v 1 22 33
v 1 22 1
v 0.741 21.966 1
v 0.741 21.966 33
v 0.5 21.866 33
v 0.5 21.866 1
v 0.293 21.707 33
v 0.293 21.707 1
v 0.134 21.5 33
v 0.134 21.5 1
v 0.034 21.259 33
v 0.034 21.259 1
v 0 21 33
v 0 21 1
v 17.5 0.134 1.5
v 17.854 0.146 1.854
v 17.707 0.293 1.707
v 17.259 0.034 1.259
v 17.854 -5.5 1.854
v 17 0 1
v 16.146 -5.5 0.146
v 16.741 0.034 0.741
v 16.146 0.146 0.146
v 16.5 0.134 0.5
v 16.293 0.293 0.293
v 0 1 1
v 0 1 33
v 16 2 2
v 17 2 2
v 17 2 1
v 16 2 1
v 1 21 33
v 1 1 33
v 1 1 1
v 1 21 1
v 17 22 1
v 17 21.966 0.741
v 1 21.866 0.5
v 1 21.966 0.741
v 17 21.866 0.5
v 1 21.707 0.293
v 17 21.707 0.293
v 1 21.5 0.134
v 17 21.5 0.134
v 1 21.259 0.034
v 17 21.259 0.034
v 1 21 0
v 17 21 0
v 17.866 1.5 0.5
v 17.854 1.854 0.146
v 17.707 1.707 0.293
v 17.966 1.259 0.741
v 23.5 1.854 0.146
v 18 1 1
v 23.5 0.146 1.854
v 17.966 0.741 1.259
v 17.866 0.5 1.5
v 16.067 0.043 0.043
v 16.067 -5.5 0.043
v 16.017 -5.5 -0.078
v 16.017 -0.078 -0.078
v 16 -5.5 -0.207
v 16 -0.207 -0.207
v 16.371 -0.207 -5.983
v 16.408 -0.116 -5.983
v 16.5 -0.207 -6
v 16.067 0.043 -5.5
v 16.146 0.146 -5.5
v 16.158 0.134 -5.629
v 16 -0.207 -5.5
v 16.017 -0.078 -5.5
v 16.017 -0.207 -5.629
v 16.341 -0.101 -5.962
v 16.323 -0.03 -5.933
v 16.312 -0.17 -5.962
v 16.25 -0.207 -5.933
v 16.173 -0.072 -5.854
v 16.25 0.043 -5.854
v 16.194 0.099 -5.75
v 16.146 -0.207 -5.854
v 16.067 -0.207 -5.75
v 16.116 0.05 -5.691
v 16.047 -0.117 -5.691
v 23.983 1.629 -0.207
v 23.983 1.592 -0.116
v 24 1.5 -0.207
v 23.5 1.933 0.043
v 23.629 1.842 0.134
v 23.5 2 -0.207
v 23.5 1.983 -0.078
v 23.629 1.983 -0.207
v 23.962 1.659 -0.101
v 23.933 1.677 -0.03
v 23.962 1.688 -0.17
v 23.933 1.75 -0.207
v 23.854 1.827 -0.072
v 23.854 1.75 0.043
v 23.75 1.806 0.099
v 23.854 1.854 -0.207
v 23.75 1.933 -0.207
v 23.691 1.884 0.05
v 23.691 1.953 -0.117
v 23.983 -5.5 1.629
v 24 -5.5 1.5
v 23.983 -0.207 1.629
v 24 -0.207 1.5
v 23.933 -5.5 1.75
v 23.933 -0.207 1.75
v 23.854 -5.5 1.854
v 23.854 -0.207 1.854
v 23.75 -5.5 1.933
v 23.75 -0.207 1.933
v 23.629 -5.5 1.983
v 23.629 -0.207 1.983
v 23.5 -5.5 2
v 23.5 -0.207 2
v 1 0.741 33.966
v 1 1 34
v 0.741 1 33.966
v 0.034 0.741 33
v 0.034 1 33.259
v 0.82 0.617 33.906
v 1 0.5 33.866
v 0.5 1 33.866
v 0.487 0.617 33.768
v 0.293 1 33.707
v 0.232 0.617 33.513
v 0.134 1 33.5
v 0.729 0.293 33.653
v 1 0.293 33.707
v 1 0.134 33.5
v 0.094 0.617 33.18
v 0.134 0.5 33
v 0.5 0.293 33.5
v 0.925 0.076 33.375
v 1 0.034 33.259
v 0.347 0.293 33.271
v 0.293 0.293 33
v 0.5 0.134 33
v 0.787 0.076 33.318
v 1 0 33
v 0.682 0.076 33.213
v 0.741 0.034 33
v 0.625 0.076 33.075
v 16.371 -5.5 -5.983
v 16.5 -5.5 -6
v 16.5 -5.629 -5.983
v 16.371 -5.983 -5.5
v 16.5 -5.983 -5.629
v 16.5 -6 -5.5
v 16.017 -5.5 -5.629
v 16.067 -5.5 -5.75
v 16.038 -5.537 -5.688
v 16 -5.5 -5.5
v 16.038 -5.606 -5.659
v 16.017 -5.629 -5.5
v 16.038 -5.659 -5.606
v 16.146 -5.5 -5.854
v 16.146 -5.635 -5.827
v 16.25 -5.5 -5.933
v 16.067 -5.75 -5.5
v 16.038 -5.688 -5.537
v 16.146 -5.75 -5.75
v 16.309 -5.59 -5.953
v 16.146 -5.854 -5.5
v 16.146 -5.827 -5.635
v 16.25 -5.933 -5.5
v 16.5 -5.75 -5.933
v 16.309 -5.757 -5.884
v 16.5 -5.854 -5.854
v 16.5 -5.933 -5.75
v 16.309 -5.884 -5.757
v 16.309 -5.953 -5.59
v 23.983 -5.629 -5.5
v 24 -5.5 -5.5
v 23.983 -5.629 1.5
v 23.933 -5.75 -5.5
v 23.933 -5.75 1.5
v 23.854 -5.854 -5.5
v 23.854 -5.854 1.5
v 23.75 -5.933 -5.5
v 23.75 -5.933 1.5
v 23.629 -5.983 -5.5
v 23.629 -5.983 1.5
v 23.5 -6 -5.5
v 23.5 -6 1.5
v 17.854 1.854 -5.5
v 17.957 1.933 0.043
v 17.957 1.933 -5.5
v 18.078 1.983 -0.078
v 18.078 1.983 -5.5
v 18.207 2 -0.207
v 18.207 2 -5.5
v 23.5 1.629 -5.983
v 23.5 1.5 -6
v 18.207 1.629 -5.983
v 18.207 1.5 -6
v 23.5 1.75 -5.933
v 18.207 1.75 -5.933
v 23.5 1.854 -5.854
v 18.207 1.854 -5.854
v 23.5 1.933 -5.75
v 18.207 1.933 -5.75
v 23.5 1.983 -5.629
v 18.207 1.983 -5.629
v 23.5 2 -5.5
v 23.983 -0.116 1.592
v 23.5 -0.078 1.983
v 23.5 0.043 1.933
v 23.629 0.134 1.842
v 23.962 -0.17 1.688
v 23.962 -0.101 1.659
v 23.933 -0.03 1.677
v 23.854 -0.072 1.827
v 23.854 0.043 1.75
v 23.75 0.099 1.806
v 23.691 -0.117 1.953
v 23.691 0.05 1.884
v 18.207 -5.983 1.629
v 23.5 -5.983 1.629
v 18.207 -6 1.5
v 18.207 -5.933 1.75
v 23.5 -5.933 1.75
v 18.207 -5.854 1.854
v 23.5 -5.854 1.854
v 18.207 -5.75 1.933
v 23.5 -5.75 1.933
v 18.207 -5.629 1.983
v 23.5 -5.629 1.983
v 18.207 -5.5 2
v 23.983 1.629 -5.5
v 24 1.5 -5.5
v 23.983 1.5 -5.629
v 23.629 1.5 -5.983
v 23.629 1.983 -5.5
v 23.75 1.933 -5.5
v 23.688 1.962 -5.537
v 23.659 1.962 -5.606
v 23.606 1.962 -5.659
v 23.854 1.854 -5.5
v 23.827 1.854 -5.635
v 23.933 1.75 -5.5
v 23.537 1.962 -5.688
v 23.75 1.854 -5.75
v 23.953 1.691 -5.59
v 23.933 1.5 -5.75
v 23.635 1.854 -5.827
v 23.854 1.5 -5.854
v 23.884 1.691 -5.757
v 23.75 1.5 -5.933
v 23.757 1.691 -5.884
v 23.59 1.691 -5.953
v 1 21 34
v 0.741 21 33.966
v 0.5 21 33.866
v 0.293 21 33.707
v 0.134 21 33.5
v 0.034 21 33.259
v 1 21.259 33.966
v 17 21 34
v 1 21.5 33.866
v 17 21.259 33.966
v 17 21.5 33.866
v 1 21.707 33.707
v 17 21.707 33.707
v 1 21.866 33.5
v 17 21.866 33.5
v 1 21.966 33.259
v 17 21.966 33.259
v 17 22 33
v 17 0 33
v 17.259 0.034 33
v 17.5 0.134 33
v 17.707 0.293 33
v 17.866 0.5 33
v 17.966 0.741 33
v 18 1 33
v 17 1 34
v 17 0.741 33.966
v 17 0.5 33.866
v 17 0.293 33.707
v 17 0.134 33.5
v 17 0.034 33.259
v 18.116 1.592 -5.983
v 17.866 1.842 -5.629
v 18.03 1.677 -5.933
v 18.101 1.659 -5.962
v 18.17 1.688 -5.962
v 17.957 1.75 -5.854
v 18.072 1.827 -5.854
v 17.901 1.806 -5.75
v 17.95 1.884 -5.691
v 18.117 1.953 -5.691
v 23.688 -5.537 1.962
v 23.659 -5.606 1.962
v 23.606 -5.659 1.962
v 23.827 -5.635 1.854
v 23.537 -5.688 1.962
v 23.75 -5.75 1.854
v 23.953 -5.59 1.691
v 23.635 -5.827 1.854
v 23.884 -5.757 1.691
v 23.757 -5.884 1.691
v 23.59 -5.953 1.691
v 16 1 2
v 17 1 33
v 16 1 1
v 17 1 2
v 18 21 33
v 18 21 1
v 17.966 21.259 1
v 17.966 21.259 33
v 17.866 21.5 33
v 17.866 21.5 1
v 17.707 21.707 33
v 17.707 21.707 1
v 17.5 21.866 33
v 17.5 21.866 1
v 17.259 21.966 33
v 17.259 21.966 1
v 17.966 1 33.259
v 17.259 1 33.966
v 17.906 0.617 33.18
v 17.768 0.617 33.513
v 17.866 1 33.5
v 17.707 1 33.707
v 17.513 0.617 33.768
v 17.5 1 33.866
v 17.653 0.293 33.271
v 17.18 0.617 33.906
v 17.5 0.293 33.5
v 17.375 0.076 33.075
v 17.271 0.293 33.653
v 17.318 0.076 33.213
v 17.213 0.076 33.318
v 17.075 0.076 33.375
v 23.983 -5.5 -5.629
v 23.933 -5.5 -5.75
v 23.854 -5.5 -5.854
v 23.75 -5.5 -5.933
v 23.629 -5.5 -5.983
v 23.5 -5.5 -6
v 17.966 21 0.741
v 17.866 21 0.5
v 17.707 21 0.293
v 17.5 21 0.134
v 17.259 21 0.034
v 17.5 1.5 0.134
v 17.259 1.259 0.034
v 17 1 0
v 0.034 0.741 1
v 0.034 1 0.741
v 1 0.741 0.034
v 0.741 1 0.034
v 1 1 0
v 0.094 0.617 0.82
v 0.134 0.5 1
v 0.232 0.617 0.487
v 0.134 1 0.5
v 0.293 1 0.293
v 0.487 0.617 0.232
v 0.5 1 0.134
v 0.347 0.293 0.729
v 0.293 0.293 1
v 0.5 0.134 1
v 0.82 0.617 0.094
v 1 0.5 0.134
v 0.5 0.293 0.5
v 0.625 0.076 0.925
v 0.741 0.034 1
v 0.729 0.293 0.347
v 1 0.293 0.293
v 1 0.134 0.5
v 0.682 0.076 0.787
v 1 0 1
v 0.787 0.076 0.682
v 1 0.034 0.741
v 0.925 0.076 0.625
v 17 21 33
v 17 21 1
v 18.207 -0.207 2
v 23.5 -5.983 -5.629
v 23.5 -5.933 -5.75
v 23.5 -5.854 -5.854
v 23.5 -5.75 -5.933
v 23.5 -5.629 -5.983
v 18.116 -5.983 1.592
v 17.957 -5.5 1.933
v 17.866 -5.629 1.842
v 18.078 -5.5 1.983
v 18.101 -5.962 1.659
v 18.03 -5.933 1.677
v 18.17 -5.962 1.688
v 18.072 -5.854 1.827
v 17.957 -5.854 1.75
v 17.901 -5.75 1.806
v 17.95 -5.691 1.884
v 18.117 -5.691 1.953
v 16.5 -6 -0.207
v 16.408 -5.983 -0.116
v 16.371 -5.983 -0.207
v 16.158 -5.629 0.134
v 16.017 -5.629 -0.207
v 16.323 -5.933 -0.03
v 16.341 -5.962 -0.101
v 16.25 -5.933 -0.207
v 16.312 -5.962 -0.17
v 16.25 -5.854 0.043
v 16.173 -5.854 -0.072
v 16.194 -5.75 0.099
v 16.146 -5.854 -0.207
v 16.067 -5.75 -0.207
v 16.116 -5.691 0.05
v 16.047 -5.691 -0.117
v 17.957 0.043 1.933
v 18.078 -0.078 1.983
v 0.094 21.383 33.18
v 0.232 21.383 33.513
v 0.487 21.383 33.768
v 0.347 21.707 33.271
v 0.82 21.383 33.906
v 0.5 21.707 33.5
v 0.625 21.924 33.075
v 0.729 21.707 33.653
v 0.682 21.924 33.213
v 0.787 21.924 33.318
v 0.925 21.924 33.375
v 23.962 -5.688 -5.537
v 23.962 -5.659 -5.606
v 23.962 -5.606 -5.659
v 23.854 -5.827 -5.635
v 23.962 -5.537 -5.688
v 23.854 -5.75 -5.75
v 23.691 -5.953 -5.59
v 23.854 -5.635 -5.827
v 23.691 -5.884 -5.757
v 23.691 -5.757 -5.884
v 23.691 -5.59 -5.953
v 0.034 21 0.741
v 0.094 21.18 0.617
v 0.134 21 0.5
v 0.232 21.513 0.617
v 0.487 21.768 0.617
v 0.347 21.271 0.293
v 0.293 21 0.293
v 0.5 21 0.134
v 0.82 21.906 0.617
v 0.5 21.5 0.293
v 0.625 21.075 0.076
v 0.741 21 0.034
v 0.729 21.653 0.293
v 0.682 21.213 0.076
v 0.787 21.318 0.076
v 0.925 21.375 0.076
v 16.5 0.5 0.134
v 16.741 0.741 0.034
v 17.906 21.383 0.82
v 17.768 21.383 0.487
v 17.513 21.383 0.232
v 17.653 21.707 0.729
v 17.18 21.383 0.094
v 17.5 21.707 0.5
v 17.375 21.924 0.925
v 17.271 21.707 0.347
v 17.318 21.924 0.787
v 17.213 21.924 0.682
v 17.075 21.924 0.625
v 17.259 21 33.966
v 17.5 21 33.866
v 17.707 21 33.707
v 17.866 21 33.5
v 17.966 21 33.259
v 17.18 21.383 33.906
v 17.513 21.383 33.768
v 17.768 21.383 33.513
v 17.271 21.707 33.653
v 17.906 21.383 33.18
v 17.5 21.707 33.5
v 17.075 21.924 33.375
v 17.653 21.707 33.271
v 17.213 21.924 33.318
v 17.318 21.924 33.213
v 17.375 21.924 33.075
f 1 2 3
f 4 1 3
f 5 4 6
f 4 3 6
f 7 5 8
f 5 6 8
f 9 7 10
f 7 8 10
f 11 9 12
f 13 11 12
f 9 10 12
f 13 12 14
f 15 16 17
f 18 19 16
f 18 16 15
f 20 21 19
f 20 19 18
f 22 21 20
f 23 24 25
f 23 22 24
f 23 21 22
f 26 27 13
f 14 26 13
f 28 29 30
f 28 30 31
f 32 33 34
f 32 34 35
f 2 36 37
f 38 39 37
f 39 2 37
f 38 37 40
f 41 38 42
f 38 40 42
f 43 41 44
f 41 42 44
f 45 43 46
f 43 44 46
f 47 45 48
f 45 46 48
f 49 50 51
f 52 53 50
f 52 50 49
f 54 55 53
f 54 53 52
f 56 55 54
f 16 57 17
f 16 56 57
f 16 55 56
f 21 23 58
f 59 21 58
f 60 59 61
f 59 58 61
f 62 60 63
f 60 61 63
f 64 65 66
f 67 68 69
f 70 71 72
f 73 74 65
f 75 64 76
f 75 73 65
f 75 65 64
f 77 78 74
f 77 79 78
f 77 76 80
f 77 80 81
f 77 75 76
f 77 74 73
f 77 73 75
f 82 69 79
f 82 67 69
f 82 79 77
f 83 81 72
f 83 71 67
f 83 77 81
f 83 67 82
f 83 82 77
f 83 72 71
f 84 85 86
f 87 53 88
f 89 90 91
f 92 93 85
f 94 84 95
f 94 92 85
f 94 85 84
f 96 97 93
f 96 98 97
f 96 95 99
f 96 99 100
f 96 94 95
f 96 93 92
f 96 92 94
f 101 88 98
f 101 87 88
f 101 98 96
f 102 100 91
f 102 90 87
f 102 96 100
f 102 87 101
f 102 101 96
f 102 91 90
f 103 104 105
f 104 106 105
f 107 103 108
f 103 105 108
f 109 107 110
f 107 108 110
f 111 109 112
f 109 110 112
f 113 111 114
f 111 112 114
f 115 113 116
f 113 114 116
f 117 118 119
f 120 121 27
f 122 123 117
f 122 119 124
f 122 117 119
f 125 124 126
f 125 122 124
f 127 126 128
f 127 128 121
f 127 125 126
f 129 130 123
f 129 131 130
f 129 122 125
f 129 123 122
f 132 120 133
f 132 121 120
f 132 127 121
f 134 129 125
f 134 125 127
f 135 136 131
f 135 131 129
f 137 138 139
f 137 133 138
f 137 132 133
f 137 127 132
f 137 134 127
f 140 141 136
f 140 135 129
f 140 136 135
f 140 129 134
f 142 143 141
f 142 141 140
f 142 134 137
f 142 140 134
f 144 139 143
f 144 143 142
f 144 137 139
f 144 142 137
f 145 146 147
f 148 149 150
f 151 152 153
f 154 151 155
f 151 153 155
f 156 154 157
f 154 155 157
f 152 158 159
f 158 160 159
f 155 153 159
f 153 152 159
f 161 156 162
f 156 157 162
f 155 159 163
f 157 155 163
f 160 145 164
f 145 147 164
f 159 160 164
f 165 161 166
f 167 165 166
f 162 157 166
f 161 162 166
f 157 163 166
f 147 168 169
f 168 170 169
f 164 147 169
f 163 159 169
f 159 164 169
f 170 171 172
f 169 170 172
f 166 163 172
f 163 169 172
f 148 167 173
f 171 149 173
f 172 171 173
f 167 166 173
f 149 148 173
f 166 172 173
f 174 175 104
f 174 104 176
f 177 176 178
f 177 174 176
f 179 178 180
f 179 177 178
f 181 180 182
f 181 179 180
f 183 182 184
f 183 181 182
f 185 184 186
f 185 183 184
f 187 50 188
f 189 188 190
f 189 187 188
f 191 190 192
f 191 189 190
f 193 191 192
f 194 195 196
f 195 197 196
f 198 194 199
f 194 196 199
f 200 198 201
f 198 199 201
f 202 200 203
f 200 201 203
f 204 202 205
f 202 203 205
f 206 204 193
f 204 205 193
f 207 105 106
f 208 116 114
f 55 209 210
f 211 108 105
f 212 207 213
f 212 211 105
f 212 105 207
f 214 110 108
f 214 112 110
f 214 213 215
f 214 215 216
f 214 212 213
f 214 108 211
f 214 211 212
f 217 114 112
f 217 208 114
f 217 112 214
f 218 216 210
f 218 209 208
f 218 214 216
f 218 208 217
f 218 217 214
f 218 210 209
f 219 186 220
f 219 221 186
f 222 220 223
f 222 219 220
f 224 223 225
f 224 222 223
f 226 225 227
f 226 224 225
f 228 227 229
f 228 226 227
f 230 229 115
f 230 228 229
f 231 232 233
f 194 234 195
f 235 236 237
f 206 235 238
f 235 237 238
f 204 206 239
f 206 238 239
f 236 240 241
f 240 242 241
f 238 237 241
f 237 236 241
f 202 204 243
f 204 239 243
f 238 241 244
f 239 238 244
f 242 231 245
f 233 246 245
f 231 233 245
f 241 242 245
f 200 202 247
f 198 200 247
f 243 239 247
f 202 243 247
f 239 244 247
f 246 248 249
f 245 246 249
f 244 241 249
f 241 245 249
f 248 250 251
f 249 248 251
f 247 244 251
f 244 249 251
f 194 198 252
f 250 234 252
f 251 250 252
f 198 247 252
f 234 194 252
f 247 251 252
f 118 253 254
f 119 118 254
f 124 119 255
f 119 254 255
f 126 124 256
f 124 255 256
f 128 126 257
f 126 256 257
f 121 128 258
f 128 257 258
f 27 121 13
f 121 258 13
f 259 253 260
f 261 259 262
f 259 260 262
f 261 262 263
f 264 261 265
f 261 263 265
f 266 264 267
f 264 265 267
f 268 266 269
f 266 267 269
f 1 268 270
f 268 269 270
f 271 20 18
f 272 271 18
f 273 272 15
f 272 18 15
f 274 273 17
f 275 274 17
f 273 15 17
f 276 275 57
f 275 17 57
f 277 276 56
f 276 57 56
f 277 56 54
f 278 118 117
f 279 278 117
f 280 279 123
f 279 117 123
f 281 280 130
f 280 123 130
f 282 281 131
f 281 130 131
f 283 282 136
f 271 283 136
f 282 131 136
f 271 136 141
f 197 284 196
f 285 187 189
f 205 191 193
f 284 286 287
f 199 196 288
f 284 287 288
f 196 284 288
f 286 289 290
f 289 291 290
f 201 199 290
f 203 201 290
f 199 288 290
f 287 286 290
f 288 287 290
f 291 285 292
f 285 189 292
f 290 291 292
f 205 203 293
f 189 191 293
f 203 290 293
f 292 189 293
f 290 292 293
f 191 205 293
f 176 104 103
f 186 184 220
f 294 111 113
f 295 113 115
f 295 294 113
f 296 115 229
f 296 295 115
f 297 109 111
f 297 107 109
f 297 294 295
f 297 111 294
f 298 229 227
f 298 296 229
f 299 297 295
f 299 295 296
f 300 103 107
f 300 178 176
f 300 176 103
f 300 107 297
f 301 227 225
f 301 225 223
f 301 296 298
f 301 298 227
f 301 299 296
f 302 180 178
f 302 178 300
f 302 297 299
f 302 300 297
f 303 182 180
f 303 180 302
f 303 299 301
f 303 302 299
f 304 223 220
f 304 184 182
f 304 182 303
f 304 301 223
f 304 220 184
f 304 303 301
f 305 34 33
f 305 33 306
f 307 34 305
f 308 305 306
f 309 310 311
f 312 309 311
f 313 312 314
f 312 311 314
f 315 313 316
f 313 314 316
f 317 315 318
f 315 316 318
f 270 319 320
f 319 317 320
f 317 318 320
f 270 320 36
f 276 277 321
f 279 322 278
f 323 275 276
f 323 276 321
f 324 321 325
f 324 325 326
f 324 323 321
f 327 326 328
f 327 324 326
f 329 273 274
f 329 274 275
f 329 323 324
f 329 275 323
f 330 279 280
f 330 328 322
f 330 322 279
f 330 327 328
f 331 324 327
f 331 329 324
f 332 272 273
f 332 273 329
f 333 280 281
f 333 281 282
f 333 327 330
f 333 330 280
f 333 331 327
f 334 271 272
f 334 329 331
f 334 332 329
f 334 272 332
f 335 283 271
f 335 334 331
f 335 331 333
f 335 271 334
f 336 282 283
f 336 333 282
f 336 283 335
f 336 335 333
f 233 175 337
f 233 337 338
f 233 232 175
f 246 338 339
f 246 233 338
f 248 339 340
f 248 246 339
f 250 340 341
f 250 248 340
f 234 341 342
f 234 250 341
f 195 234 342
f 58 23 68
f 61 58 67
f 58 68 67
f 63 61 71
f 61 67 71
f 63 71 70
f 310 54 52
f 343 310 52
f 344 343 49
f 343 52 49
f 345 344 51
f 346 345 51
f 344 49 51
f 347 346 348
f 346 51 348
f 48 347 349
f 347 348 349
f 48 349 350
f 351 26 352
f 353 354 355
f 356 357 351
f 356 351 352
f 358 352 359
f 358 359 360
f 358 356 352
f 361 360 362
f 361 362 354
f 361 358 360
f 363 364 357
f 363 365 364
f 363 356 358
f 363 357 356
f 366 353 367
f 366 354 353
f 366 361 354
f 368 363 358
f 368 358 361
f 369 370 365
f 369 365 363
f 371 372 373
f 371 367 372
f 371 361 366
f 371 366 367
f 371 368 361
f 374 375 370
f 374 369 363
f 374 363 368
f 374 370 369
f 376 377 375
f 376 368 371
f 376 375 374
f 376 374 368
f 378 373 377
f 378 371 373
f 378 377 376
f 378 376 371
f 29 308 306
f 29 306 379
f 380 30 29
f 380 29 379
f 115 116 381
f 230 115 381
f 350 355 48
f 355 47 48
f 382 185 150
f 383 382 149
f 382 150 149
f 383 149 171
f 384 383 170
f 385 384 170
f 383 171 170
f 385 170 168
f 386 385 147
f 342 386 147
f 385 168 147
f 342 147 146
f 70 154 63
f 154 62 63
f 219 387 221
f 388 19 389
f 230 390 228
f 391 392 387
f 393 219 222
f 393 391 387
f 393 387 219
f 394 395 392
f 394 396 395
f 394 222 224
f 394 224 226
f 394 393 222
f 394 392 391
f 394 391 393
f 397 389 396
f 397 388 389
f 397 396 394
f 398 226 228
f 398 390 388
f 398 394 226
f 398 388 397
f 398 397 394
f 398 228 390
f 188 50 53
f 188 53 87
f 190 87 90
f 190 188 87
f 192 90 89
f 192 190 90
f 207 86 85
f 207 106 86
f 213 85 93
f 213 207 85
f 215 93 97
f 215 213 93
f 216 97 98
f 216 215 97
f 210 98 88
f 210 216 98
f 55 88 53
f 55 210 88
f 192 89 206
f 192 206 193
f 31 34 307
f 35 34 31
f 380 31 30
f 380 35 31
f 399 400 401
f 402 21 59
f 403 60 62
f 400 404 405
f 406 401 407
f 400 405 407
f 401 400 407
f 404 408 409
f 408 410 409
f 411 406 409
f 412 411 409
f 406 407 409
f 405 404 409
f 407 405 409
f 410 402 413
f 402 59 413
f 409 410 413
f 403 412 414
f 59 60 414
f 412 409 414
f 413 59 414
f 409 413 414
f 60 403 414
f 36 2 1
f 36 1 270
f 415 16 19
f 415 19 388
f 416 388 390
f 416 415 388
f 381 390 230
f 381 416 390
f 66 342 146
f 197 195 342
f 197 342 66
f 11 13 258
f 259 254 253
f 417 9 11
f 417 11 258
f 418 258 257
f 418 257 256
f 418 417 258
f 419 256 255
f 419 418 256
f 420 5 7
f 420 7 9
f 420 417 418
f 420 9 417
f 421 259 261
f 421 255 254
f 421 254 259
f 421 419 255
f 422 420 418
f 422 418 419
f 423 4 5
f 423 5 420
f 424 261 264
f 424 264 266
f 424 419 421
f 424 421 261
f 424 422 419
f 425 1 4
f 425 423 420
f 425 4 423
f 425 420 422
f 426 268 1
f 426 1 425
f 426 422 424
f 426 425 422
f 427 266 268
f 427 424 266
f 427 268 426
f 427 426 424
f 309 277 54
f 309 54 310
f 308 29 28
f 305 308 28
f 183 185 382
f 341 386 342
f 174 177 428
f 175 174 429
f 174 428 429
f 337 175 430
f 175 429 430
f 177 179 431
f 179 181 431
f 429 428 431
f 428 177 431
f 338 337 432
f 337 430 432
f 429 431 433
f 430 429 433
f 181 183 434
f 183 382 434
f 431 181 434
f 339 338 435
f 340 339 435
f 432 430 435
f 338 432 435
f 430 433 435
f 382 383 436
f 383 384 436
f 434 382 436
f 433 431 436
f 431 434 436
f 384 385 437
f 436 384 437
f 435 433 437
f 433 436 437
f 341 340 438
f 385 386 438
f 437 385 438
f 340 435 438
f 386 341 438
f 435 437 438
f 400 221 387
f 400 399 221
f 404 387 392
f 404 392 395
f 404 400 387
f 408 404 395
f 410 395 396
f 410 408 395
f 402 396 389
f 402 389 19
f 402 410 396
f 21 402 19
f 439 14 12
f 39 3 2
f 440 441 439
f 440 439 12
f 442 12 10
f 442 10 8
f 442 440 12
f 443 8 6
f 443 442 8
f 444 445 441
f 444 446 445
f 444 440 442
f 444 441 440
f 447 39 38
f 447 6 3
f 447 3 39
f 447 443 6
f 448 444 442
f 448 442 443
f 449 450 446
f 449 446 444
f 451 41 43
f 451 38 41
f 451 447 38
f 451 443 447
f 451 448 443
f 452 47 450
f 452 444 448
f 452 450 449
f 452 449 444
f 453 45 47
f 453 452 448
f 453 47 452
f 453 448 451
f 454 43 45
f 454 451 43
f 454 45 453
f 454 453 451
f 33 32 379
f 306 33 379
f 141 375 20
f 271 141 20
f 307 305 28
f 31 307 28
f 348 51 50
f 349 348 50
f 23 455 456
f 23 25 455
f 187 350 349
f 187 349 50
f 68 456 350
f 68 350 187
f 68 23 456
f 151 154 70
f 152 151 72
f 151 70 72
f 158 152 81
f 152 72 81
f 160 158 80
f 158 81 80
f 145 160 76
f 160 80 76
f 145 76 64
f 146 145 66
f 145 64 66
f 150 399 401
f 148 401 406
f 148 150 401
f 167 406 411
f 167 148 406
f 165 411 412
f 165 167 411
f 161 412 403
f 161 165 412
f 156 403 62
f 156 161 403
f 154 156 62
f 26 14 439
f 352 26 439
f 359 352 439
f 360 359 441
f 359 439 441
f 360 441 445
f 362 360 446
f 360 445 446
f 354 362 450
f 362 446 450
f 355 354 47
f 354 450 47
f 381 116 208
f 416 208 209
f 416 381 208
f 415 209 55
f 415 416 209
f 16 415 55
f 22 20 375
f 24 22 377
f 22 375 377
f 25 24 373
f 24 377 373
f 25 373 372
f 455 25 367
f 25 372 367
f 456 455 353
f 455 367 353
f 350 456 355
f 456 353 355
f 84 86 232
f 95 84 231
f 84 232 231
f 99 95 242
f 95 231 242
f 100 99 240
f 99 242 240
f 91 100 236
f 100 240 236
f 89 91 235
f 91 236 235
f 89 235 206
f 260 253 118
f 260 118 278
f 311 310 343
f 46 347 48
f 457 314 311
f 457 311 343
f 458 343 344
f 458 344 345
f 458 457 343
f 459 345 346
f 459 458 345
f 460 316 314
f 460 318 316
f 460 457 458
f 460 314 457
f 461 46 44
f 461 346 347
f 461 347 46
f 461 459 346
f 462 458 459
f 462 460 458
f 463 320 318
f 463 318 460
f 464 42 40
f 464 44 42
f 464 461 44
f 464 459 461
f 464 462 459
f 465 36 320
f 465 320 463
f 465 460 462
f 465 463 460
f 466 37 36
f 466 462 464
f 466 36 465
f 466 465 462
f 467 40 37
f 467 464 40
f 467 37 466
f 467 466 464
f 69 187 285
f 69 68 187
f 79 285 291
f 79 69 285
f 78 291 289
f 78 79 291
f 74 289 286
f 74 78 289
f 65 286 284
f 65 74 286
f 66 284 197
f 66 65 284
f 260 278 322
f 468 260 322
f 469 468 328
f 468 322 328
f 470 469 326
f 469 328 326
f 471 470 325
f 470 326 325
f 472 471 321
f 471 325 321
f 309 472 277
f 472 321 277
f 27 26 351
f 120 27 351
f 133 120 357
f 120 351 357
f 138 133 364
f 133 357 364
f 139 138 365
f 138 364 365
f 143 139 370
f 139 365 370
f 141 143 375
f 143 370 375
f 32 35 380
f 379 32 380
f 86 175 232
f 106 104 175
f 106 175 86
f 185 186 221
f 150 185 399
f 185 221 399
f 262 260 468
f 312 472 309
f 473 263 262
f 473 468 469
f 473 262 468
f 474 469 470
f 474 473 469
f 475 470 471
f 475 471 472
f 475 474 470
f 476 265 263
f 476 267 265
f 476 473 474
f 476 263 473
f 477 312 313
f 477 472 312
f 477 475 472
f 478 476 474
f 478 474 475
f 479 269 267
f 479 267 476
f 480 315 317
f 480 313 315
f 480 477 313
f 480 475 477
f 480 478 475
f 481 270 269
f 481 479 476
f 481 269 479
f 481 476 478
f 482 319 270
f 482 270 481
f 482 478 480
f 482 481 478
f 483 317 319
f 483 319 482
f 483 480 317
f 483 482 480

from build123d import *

# Parameters (mm, degrees)
SKETCH1_W                = 18
SKETCH1_H                = 22
BOSS_EXTRUDE1_DEPTH      = 34
SHELL1_T                 = 1
BOSS_EXTRUDE3_DEPTH      = 6
BOSS_EXTRUDE3_DEPTH_BACK = 2
SKETCH2_W                = 8
SKETCH2_H                = 8
CHAMFER2_SIZE            = 2
FILLET1_R                = 1
FILLET2_R                = 0.5


with BuildPart() as part:
    # Sketch1 → Boss-Extrude1 (new body)
    with BuildSketch(Plane.XY):
        with Locations((9, 11)):
            Rectangle(SKETCH1_W, SKETCH1_H)
    extrude(amount=BOSS_EXTRUDE1_DEPTH)

    # Shell1 (no face opened: a closed hollow body)
    add(offset(amount=-SHELL1_T, mode=Mode.PRIVATE), mode=Mode.SUBTRACT)

    # Sketch2 → Boss-Extrude3 (add, two sides: drawn at the far end of the back side and taken through both)
    with BuildSketch(Plane(origin=(0, 0, 0), x_dir=(-1, 0, 0), z_dir=(0, 0, -1)).offset(-BOSS_EXTRUDE3_DEPTH_BACK)):
        with Locations((-20, -2)):
            Rectangle(SKETCH2_W, SKETCH2_H)
    extrude(amount=BOSS_EXTRUDE3_DEPTH + BOSS_EXTRUDE3_DEPTH_BACK)

    # Chamfer2
    chamfer2_edges = [part.edges().sort_by_distance(p)[0] for p in [
        (16, -3, 2),
        (16, 2, -3),
        (21, 2, 2),
    ]]
    chamfer(chamfer2_edges, length=CHAMFER2_SIZE)

    # Fillet1
    # the kernel refuses this fillet: 1 mm, written as the material it takes off along each edge
    with BuildSketch(Plane(origin=(1, 21, 1), x_dir=(0, 1, 0), z_dir=(0, 0, -1))) as fillet1_piece_1_section:
        Polygon((0, 0), (FILLET1_R, 0), (FILLET1_R, -FILLET1_R), (0, -FILLET1_R), align=None)
    fillet1_piece_1 = extrude(amount=FILLET1_R, mode=Mode.PRIVATE)
    fillet1_piece_1 = fillet1_piece_1 - Plane(origin=(1, 21, 1), x_dir=(0.7071067811865476, -0.7071067811865475, 0), z_dir=(0, 0, -1)) * Sphere(FILLET1_R, mode=Mode.PRIVATE)
    add(fillet1_piece_1, mode=Mode.SUBTRACT)
    with BuildSketch(Plane(origin=(1, 1, 1), x_dir=(0, 0, -1), z_dir=(0, -1, 0))) as fillet1_piece_2_section:
        Polygon((0, 0), (FILLET1_R, 0), (FILLET1_R, -FILLET1_R), (0, -FILLET1_R), align=None)
    fillet1_piece_2 = extrude(amount=FILLET1_R, mode=Mode.PRIVATE)
    fillet1_piece_2 = fillet1_piece_2 - Plane(origin=(1, 1, 1), x_dir=(0.7071067811865475, 0, 0.7071067811865475), z_dir=(0, -1, 0)) * Sphere(FILLET1_R, mode=Mode.PRIVATE)
    add(fillet1_piece_2, mode=Mode.SUBTRACT)
    with BuildSketch(Plane(origin=(17, 21, 1), x_dir=(0, 0, -1), z_dir=(0, 1, 0))) as fillet1_piece_3_section:
        Polygon((0, 0), (FILLET1_R, 0), (FILLET1_R, -FILLET1_R), (0, -FILLET1_R), align=None)
    fillet1_piece_3 = extrude(amount=FILLET1_R, mode=Mode.PRIVATE)
    fillet1_piece_3 = fillet1_piece_3 - Plane(origin=(17, 21, 1), x_dir=(-0.7071067811865475, 0, 0.7071067811865475), z_dir=(0, 1, 0)) * Sphere(FILLET1_R, mode=Mode.PRIVATE)
    add(fillet1_piece_3, mode=Mode.SUBTRACT)
    with BuildSketch(Plane(origin=(1, 1, 33), x_dir=(-1, 0, 0), z_dir=(0, -1, 0))) as fillet1_piece_4_section:
        Polygon((0, 0), (FILLET1_R, 0), (FILLET1_R, -FILLET1_R), (0, -FILLET1_R), align=None)
    fillet1_piece_4 = extrude(amount=FILLET1_R, mode=Mode.PRIVATE)
    fillet1_piece_4 = fillet1_piece_4 - Plane(origin=(1, 1, 33), x_dir=(0.7071067811865475, 0, -0.7071067811865475), z_dir=(0, -1, 0)) * Sphere(FILLET1_R, mode=Mode.PRIVATE)
    add(fillet1_piece_4, mode=Mode.SUBTRACT)
    with BuildSketch(Plane(origin=(17, 1, 33), x_dir=(1, 0, 0), z_dir=(0, -1, 0))) as fillet1_piece_5_section:
        Polygon((0, 0), (FILLET1_R, 0), (FILLET1_R, FILLET1_R), (0, FILLET1_R), align=None)
    fillet1_piece_5 = extrude(amount=FILLET1_R, mode=Mode.PRIVATE)
    fillet1_piece_5 = fillet1_piece_5 - Plane(origin=(17, 1, 33), x_dir=(-0.7071067811865475, 0, -0.7071067811865475), z_dir=(0, -1, 0)) * Sphere(FILLET1_R, mode=Mode.PRIVATE)
    add(fillet1_piece_5, mode=Mode.SUBTRACT)
    with BuildSketch(Plane(origin=(17, 21, 33), x_dir=(1, 0, 0), z_dir=(0, 1, 0))) as fillet1_piece_6_section:
        Polygon((0, 0), (FILLET1_R, 0), (FILLET1_R, -FILLET1_R), (0, -FILLET1_R), align=None)
    fillet1_piece_6 = extrude(amount=FILLET1_R, mode=Mode.PRIVATE)
    fillet1_piece_6 = fillet1_piece_6 - Plane(origin=(17, 21, 33), x_dir=(-0.7071067811865475, 0, -0.7071067811865475), z_dir=(0, 1, 0)) * Sphere(FILLET1_R, mode=Mode.PRIVATE)
    add(fillet1_piece_6, mode=Mode.SUBTRACT)
    with BuildSketch(Plane(origin=(1, 21, 33), x_dir=(-1, 0, 0), z_dir=(0, 1, 0))) as fillet1_piece_7_section:
        Polygon((0, 0), (FILLET1_R, 0), (FILLET1_R, FILLET1_R), (0, FILLET1_R), align=None)
    fillet1_piece_7 = extrude(amount=FILLET1_R, mode=Mode.PRIVATE)
    fillet1_piece_7 = fillet1_piece_7 - Plane(origin=(1, 21, 33), x_dir=(0.7071067811865475, 0, -0.7071067811865475), z_dir=(0, 1, 0)) * Sphere(FILLET1_R, mode=Mode.PRIVATE)
    add(fillet1_piece_7, mode=Mode.SUBTRACT)
    with BuildSketch(Plane(origin=(0, 21, 0), x_dir=(1, 0, 0), z_dir=(0, -1, 0)), Plane(origin=(18, 1, 34), x_dir=(0, 0, -1), z_dir=(0, 1, 0)), Plane(origin=(0, 21, 34), x_dir=(0, 0, -1), z_dir=(0, -1, 0))) as fillet1_piece_8:
        with BuildLine():
            CenterArc((FILLET1_R, FILLET1_R), FILLET1_R, 180, 90)
            Line((0, FILLET1_R), (0, 0))
            Line((0, 0), (FILLET1_R, 0))
        make_face()
    extrude(amount=20, mode=Mode.SUBTRACT)
    with BuildSketch(Plane(origin=(1, 0, 0), x_dir=(0, 0, 1), z_dir=(1, 0, 0))) as fillet1_piece_9_section:
        with BuildLine():
            CenterArc((FILLET1_R, -FILLET1_R), FILLET1_R, 90, 90)
            Line((0, -FILLET1_R), (0, 0))
            Line((0, 0), (FILLET1_R, 0))
        make_face()
    fillet1_piece_9 = extrude(amount=17.5, mode=Mode.PRIVATE)
    fillet1_piece_9 = split(fillet1_piece_9, bisect_by=Plane(origin=(12.381861728, 0.226424858, -3.618138272), z_dir=(-0.7071067811865476, 0, 0.7071067811865476)), keep=Keep.TOP, mode=Mode.PRIVATE)
    fillet1_piece_9 = split(fillet1_piece_9, bisect_by=Plane(origin=(12.381861728, -3.618138272, 0.226424858), z_dir=(-0.7071067811865476, 0.7071067811865476, 0)), keep=Keep.TOP, mode=Mode.PRIVATE)
    add(fillet1_piece_9, mode=Mode.SUBTRACT)
    with BuildSketch(Plane(origin=(1, 0, 0), x_dir=(0, 0, 1), z_dir=(1, 0, 0))) as fillet1_piece_10_section:
        with BuildLine():
            CenterArc((FILLET1_R, -FILLET1_R), FILLET1_R, 90, 90)
            Line((0, -FILLET1_R), (0, 0))
            Line((0, 0), (FILLET1_R, 0))
        make_face()
    fillet1_piece_10 = extrude(amount=17.5, mode=Mode.PRIVATE)
    fillet1_piece_10 = split(fillet1_piece_10, bisect_by=Plane(origin=(16.16446835, 0.528927527, 0.16446835), z_dir=(0.7071067811865476, 0, -0.7071067811865476)), keep=Keep.TOP, mode=Mode.PRIVATE)
    fillet1_piece_10 = split(fillet1_piece_10, bisect_by=Plane(origin=(16.407441135, 0.407441135, 0.042981958), z_dir=(-0.7071067811865476, 0.7071067811865476, 0)), keep=Keep.TOP, mode=Mode.PRIVATE)
    add(fillet1_piece_10, mode=Mode.SUBTRACT)
    with BuildSketch(Plane(origin=(1, 0, 0), x_dir=(0, 0, 1), z_dir=(1, 0, 0))) as fillet1_piece_11_section:
        with BuildLine():
            CenterArc((FILLET1_R, -FILLET1_R), FILLET1_R, 90, 90)
            Line((0, -FILLET1_R), (0, 0))
            Line((0, 0), (FILLET1_R, 0))
        make_face()
    fillet1_piece_11 = extrude(amount=17.5, mode=Mode.PRIVATE)
    fillet1_piece_11 = split(fillet1_piece_11, bisect_by=Plane(origin=(16.407441135, 0.042981958, 0.407441135), z_dir=(-0.7071067811865476, 0, 0.7071067811865476)), keep=Keep.TOP, mode=Mode.PRIVATE)
    fillet1_piece_11 = split(fillet1_piece_11, bisect_by=Plane(origin=(16.16446835, 0.16446835, 0.528927527), z_dir=(0.7071067811865476, -0.7071067811865476, 0)), keep=Keep.TOP, mode=Mode.PRIVATE)
    add(fillet1_piece_11, mode=Mode.SUBTRACT)
    with BuildSketch(Plane(origin=(18, -0.5, 0), x_dir=(-1, 0, 0), z_dir=(0, 1, 0))) as fillet1_piece_12_section:
        with BuildLine():
            CenterArc((FILLET1_R, FILLET1_R), FILLET1_R, 180, 90)
            Line((0, FILLET1_R), (0, 0))
            Line((0, 0), (FILLET1_R, 0))
        make_face()
    fillet1_piece_12 = extrude(amount=21.5, mode=Mode.PRIVATE)
    fillet1_piece_12 = split(fillet1_piece_12, bisect_by=Plane(origin=(17.83553165, 1.83553165, 0.528927527), z_dir=(0.7071067811865476, -0.7071067811865476, 0)), keep=Keep.TOP, mode=Mode.PRIVATE)
    fillet1_piece_12 = split(fillet1_piece_12, bisect_by=Plane(origin=(17.957018042, 1.592558865, 0.407441135), z_dir=(0, 0.7071067811865476, 0.7071067811865476)), keep=Keep.TOP, mode=Mode.PRIVATE)
    add(fillet1_piece_12, mode=Mode.SUBTRACT)
    with BuildSketch(Plane(origin=(18, -0.5, 0), x_dir=(-1, 0, 0), z_dir=(0, 1, 0))) as fillet1_piece_13_section:
        with BuildLine():
            CenterArc((FILLET1_R, FILLET1_R), FILLET1_R, 180, 90)
            Line((0, FILLET1_R), (0, 0))
            Line((0, 0), (FILLET1_R, 0))
        make_face()
    fillet1_piece_13 = extrude(amount=21.5, mode=Mode.PRIVATE)
    fillet1_piece_13 = split(fillet1_piece_13, bisect_by=Plane(origin=(17.592558865, 1.592558865, 0.042981958), z_dir=(-0.7071067811865476, 0.7071067811865476, 0)), keep=Keep.TOP, mode=Mode.PRIVATE)
    fillet1_piece_13 = split(fillet1_piece_13, bisect_by=Plane(origin=(17.471072473, 1.83553165, 0.16446835), z_dir=(0, -0.7071067811865476, -0.7071067811865476)), keep=Keep.TOP, mode=Mode.PRIVATE)
    add(fillet1_piece_13, mode=Mode.SUBTRACT)
    with BuildSketch(Plane(origin=(18, -0.5, 0), x_dir=(-1, 0, 0), z_dir=(0, 1, 0))) as fillet1_piece_14_section:
        with BuildLine():
            CenterArc((FILLET1_R, FILLET1_R), FILLET1_R, 180, 90)
            Line((0, FILLET1_R), (0, 0))
            Line((0, 0), (FILLET1_R, 0))
        make_face()
    fillet1_piece_14 = extrude(amount=21.5, mode=Mode.PRIVATE)
    fillet1_piece_14 = split(fillet1_piece_14, bisect_by=Plane(origin=(22.618159496, 6.618159496, 0.226418621), z_dir=(-0.7071067811865476, 0.7071067811865476, 0)), keep=Keep.TOP, mode=Mode.PRIVATE)
    fillet1_piece_14 = split(fillet1_piece_14, bisect_by=Plane(origin=(17.773581379, 6.618159496, -4.618159496), z_dir=(0, 0.7071067811865476, 0.7071067811865476)), keep=Keep.TOP, mode=Mode.PRIVATE)
    add(fillet1_piece_14, mode=Mode.SUBTRACT)
    with BuildSketch(Plane(origin=(17, 22, 0), x_dir=(0, -1, 0), z_dir=(-1, 0, 0)), Plane(origin=(1, 0, 34), x_dir=(0, 0, -1), z_dir=(1, 0, 0))) as fillet1_piece_15:
        with BuildLine():
            CenterArc((FILLET1_R, FILLET1_R), FILLET1_R, 180, 90)
            Line((0, FILLET1_R), (0, 0))
            Line((0, 0), (FILLET1_R, 0))
        make_face()
    extrude(amount=16, mode=Mode.SUBTRACT)
    with BuildSketch(Plane(origin=(17, 22, 34), x_dir=(0, -1, 0), z_dir=(-1, 0, 0))) as fillet1_piece_16:
        with BuildLine():
            CenterArc((FILLET1_R, -FILLET1_R), FILLET1_R, 90, 90)
            Line((0, -FILLET1_R), (0, 0))
            Line((0, 0), (FILLET1_R, 0))
        make_face()
    extrude(amount=16, mode=Mode.SUBTRACT)
    with BuildSketch(Plane(origin=(0, 22, 1), x_dir=(0, -1, 0), z_dir=(0, 0, 1)), Plane(origin=(0, 0, 1), x_dir=(1, 0, 0), z_dir=(0, 0, 1))) as fillet1_piece_17:
        with BuildLine():
            CenterArc((FILLET1_R, FILLET1_R), FILLET1_R, 180, 90)
            Line((0, FILLET1_R), (0, 0))
            Line((0, 0), (FILLET1_R, 0))
        make_face()
    extrude(amount=32, mode=Mode.SUBTRACT)
    with BuildSketch(Plane(origin=(18, 22, 1), x_dir=(0, -1, 0), z_dir=(0, 0, 1))) as fillet1_piece_18:
        with BuildLine():
            CenterArc((FILLET1_R, -FILLET1_R), FILLET1_R, 90, 90)
            Line((0, -FILLET1_R), (0, 0))
            Line((0, 0), (FILLET1_R, 0))
        make_face()
    extrude(amount=32, mode=Mode.SUBTRACT)
    with BuildSketch(Plane(origin=(18, 0, -0.5), x_dir=(-1, 0, 0), z_dir=(0, 0, 1))) as fillet1_piece_19_section:
        with BuildLine():
            CenterArc((FILLET1_R, -FILLET1_R), FILLET1_R, 90, 90)
            Line((0, -FILLET1_R), (0, 0))
            Line((0, 0), (FILLET1_R, 0))
        make_face()
    fillet1_piece_19 = extrude(amount=33.5, mode=Mode.PRIVATE)
    fillet1_piece_19 = split(fillet1_piece_19, bisect_by=Plane(origin=(17.83553165, 0.528927527, 1.83553165), z_dir=(0.7071067811865476, 0, -0.7071067811865476)), keep=Keep.TOP, mode=Mode.PRIVATE)
    fillet1_piece_19 = split(fillet1_piece_19, bisect_by=Plane(origin=(17.957018042, 0.407441135, 1.592558865), z_dir=(0, 0.7071067811865476, 0.7071067811865476)), keep=Keep.TOP, mode=Mode.PRIVATE)
    add(fillet1_piece_19, mode=Mode.SUBTRACT)
    with BuildSketch(Plane(origin=(18, 0, -0.5), x_dir=(-1, 0, 0), z_dir=(0, 0, 1))) as fillet1_piece_20_section:
        with BuildLine():
            CenterArc((FILLET1_R, -FILLET1_R), FILLET1_R, 90, 90)
            Line((0, -FILLET1_R), (0, 0))
            Line((0, 0), (FILLET1_R, 0))
        make_face()
    fillet1_piece_20 = extrude(amount=33.5, mode=Mode.PRIVATE)
    fillet1_piece_20 = split(fillet1_piece_20, bisect_by=Plane(origin=(17.592558865, 0.042981958, 1.592558865), z_dir=(-0.7071067811865476, 0, 0.7071067811865476)), keep=Keep.TOP, mode=Mode.PRIVATE)
    fillet1_piece_20 = split(fillet1_piece_20, bisect_by=Plane(origin=(17.471072473, 0.16446835, 1.83553165), z_dir=(0, -0.7071067811865476, -0.7071067811865476)), keep=Keep.TOP, mode=Mode.PRIVATE)
    add(fillet1_piece_20, mode=Mode.SUBTRACT)
    with BuildSketch(Plane(origin=(18, 0, -0.5), x_dir=(-1, 0, 0), z_dir=(0, 0, 1))) as fillet1_piece_21_section:
        with BuildLine():
            CenterArc((FILLET1_R, -FILLET1_R), FILLET1_R, 90, 90)
            Line((0, -FILLET1_R), (0, 0))
            Line((0, 0), (FILLET1_R, 0))
        make_face()
    fillet1_piece_21 = extrude(amount=33.5, mode=Mode.PRIVATE)
    fillet1_piece_21 = split(fillet1_piece_21, bisect_by=Plane(origin=(25.618190384, 0.226409543, 9.618190384), z_dir=(-0.7071067811865476, 0, 0.7071067811865476)), keep=Keep.TOP, mode=Mode.PRIVATE)
    fillet1_piece_21 = split(fillet1_piece_21, bisect_by=Plane(origin=(17.773590457, -7.618190384, 9.618190384), z_dir=(0, 0.7071067811865476, 0.7071067811865476)), keep=Keep.TOP, mode=Mode.PRIVATE)
    add(fillet1_piece_21, mode=Mode.SUBTRACT)

    # Fillet2
    fillet2_edges = [part.edges().sort_by_distance(p)[0] for p in [
        (20, -6, -6),
        (24, -6, -2),
        (24, -2, -6),
        (24, 2, -3),
        (21, 2, -6),
        (18, 2, -3),
        (21, 2, 0),
        (24, -3, 2),
        (24, 1, 1),
        (21, -6, 2),
        (18, -3, 2),
        (21, 0, 2),
        (16, -3, -6),
        (16, -6, -3),
        (16, -3, 0),
        (16, 0, -3),
        (17, 1, -6),
        (17, -6, 1),
    ]]
    fillet(fillet2_edges, radius=FILLET2_R)


solid = part.part
